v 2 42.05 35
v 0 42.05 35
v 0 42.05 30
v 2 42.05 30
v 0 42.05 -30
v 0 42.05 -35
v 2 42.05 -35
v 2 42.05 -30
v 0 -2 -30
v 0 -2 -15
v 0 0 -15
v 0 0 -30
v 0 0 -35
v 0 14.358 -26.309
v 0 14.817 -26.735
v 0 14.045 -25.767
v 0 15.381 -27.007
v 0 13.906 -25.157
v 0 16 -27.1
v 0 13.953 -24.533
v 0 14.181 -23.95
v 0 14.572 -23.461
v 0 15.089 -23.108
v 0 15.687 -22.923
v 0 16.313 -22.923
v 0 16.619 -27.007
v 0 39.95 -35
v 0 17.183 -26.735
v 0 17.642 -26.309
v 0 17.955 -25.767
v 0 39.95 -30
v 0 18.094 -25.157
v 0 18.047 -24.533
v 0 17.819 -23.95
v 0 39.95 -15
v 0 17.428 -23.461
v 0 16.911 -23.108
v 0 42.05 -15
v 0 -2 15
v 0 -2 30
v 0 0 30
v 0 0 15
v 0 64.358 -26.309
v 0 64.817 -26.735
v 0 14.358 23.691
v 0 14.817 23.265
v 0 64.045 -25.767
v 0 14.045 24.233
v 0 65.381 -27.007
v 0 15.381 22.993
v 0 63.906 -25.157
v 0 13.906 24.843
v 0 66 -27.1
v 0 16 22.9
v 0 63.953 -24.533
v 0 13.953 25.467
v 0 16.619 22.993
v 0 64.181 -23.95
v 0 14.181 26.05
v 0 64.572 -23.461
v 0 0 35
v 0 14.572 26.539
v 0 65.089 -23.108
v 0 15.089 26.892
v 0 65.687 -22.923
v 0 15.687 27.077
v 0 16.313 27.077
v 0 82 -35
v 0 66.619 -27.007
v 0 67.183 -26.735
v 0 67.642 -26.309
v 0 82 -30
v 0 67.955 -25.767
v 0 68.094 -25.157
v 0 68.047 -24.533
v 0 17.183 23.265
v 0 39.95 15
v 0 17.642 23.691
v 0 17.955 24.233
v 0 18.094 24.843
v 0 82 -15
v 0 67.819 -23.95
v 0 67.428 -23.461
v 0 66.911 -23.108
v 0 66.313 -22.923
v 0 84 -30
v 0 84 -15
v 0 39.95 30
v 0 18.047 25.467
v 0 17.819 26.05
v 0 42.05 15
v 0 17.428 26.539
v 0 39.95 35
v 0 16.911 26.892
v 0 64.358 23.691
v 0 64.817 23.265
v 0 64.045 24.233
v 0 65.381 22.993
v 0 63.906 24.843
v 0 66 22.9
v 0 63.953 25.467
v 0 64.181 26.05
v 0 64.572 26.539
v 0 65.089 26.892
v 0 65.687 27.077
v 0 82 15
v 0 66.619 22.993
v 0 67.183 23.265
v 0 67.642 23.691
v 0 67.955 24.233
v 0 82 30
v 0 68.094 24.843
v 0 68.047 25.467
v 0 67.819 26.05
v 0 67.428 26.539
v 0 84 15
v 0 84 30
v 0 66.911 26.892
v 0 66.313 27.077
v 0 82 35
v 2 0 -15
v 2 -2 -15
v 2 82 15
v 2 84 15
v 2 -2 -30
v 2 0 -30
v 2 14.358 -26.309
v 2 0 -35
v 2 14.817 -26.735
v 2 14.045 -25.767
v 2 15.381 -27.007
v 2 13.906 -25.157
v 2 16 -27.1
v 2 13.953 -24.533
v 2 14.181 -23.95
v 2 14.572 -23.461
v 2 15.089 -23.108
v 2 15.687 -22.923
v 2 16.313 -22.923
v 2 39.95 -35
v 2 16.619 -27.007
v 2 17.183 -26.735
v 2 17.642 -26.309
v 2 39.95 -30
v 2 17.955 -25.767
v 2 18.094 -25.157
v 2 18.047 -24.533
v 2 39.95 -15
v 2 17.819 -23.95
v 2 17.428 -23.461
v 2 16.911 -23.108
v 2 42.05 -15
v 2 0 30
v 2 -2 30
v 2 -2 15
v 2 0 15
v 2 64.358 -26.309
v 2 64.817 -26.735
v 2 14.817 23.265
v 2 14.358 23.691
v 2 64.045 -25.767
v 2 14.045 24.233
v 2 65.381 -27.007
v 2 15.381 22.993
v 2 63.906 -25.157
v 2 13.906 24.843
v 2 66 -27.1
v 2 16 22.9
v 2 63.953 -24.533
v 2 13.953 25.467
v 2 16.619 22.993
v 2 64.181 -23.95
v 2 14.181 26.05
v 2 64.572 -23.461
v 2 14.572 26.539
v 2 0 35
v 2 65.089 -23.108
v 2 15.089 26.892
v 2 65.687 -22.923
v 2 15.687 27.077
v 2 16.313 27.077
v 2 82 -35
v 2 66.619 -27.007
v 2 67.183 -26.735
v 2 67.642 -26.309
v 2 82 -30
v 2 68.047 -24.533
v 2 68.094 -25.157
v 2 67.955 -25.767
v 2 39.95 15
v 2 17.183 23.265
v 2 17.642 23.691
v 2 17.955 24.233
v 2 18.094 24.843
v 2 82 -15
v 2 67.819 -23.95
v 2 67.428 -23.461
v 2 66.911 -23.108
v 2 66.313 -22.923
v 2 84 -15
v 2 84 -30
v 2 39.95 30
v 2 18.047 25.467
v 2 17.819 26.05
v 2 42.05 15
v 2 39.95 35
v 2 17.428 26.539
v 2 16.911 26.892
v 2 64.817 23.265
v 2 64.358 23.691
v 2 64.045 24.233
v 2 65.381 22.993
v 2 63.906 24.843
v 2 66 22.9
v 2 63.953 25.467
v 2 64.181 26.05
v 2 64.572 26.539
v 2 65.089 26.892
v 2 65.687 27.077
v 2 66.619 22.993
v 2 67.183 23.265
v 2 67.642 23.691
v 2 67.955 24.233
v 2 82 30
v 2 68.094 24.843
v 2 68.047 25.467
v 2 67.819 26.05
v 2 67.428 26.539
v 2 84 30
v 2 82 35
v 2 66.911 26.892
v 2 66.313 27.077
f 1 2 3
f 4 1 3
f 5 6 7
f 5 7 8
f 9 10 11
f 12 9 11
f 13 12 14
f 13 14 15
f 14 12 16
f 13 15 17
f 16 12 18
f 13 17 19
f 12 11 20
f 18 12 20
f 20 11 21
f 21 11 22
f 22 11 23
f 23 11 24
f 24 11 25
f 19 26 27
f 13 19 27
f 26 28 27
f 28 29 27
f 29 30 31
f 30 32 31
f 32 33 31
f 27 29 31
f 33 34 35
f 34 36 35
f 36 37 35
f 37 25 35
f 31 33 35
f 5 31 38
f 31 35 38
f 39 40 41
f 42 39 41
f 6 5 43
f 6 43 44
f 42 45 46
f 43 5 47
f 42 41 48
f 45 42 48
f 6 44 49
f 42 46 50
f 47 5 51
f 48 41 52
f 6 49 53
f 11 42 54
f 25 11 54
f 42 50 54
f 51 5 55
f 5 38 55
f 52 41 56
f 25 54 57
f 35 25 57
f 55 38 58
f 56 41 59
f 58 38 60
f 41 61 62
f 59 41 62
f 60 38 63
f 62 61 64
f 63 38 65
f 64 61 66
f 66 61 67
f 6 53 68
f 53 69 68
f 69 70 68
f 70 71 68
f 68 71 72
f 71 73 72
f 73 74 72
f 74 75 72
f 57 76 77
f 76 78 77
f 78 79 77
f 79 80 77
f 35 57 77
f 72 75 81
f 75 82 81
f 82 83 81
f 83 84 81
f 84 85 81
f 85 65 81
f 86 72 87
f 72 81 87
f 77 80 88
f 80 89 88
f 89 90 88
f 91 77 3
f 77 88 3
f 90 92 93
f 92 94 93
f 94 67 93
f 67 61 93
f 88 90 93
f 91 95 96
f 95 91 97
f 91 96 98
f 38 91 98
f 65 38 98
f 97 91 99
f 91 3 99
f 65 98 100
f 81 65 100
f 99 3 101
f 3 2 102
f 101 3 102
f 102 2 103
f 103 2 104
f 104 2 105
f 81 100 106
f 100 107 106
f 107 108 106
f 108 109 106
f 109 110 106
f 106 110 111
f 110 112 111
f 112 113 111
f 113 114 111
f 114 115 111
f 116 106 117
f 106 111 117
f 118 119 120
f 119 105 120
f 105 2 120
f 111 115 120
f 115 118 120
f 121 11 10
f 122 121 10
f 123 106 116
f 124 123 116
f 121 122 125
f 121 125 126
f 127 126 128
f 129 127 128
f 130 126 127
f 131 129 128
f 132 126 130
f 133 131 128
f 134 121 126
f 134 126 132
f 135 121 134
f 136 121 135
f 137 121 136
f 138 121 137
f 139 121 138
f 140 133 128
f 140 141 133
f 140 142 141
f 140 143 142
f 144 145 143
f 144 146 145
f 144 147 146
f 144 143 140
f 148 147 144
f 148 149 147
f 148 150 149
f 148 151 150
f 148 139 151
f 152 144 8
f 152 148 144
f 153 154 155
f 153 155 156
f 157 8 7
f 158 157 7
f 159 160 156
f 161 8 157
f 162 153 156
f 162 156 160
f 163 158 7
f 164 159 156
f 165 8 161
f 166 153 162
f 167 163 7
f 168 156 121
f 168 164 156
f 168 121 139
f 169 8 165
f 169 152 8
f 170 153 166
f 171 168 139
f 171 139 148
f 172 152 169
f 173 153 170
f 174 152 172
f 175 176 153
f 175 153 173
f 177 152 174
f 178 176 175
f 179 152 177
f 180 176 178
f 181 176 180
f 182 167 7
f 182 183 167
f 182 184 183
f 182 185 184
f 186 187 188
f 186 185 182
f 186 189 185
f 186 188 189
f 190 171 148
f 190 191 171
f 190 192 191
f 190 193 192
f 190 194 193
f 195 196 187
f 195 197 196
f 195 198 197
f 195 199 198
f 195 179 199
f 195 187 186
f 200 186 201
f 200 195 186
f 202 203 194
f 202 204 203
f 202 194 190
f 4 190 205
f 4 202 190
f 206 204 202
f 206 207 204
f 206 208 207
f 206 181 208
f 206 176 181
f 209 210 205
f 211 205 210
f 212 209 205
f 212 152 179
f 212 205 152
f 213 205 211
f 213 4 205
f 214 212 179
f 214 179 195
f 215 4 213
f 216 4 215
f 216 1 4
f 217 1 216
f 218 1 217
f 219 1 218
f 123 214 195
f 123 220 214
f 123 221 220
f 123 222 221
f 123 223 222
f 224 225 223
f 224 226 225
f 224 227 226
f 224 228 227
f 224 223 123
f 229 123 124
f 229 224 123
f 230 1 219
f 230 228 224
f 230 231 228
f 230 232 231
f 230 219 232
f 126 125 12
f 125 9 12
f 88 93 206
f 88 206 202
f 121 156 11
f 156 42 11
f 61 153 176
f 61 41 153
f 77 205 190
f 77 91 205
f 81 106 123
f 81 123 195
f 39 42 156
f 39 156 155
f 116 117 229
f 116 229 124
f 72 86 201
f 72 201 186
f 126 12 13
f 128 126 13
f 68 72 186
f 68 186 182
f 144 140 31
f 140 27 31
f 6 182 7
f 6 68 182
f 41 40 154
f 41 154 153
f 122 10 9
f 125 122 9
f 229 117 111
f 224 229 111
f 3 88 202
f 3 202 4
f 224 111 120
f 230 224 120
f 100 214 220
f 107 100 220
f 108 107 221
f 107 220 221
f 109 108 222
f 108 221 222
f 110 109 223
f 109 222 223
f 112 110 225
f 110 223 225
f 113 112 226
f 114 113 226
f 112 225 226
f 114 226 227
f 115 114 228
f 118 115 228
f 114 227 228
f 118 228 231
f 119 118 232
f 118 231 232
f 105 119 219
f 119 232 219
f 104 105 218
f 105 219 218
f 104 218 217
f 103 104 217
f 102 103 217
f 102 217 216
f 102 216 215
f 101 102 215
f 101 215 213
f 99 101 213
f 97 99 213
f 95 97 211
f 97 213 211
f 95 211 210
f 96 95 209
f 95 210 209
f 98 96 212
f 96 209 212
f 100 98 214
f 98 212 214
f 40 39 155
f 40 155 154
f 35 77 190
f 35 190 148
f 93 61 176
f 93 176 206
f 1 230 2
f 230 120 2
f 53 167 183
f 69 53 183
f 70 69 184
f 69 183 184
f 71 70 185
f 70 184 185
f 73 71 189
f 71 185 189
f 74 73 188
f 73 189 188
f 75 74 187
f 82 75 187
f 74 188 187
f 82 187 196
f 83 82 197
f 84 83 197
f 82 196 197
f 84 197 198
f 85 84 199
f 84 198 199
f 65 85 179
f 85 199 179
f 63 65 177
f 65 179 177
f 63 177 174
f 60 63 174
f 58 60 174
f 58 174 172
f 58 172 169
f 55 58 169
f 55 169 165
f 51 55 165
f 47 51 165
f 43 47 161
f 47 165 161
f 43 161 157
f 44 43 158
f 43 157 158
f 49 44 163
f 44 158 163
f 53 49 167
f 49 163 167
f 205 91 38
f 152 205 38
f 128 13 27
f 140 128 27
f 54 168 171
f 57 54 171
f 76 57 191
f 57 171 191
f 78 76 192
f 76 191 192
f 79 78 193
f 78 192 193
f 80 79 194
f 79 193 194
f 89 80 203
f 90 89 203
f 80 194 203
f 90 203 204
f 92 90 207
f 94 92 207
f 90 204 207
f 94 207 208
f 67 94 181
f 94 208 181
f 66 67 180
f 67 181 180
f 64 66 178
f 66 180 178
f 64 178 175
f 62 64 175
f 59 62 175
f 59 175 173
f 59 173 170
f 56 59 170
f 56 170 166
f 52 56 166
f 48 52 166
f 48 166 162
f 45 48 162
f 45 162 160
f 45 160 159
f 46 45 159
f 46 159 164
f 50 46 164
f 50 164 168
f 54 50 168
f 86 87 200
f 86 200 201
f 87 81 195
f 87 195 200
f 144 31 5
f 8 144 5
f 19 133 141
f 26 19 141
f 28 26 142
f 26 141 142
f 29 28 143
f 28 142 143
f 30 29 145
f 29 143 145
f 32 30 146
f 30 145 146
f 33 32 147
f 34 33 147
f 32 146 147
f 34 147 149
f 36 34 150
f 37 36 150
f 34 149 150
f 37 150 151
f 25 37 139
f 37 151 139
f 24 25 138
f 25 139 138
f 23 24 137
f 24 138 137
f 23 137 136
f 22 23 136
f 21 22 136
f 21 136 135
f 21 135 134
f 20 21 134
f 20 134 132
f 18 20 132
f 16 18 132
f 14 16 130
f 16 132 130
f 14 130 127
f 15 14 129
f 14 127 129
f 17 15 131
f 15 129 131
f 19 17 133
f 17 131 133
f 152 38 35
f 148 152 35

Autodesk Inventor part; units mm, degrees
ref_plane "YZ Plane" through (0, 0, 0) normal (1, 0, 0) x (0, 1, 0)
ref_plane "XZ Plane" through (0, 0, 0) normal (0, 1, 0) x (-1, 0, 0)
ref_plane "XY Plane" through (0, 0, 0) normal (0, 0, 1) x (1, 0, 0)
sketch "Sketch1" plane through (0, 0, 0) normal (1, 0, 0) x (0, 1, 0)
  line L0 (0, 15) -> (0, 0)
  line L1 (0, 15) -> (-2, 15)
  line L2 (-2, 15) -> (-2, 30)
  line L3 (-2, 30) -> (0, 30)
  line L4 (0, 30) -> (0, 35)
  line L5 (0, 35) -> (39.95, 35)
  line L6 (20, 0) -> (0, 0) construction
  line L7 (39.95, 35) -> (39.95, 30)
  line L8 (39.95, 30) -> (42.05, 30)
  line L9 (42.05, 15) -> (39.95, 15)
  line L10 (39.95, 15) -> (39.95, 0)
  line L11 (39.95, 0) -> (20, 0) construction
  line L12 (0, -15) -> (0, 0)
  line L13 (0, -15) -> (-2, -15)
  line L14 (-2, -15) -> (-2, -30)
  line L15 (-2, -30) -> (0, -30)
  line L16 (0, -30) -> (0, -35)
  line L17 (0, -35) -> (39.95, -35)
  line L18 (39.95, -35) -> (39.95, -30)
  line L19 (39.95, -30) -> (42.05, -30)
  line L20 (42.05, -15) -> (39.95, -15)
  line L21 (39.95, -15) -> (39.95, 0)
  line L22 (41, 30) -> (41, -30) construction
  line L23 (82, 15) -> (82, 0)
  line L24 (82, 15) -> (84, 15)
  line L25 (84, 30) -> (82, 30)
  line L26 (82, 30) -> (82, 35)
  line L27 (82, 35) -> (42.05, 35)
  line L28 (42.05, 35) -> (42.05, 30)
  line L29 (42.05, 15) -> (42.05, 0)
  line L30 (42.05, -35) -> (42.05, -30)
  line L31 (42.05, -15) -> (42.05, 0)
  line L32 (82, -15) -> (84, -15)
  line L33 (84, -15) -> (84, -30)
  line L34 (84, -30) -> (82, -30)
  line L35 (82, -30) -> (82, -35)
  line L36 (82, -15) -> (82, 0)
  line L37 (82, -35) -> (42.05, -35)
  line L38 (84, 30) -> (84, 15)
  dimension "d3" = 15
  dimension "d6" = 20
  dimension "d7" = 35
  dimension "d8" = 15
  dimension "d9" = 2
  dimension "d17" = 2.1
  dimension "d23" = 41
extrude "Wyciągnięcie proste1" add sketch "Sketch1" along normal blind 2
sketch "Szkic3" plane through (2, 0, 0) normal (1, 0, 0) x (0, 0, -1)
  line L0 (-25, 16) -> (25, 16) construction
  line L1 (25, 16) -> (25, 66) construction
  line L2 (25, 66) -> (-25, 66) construction
  line L3 (-25, 66) -> (-25, 16) construction
  line L4 (-25, 16) -> (25, 66) construction
  line L5 (25, 16) -> (-25, 66) construction
  line L6 (0, 41) -> (0, 42.05) construction
  line L7 (-15, 42.05) -> (15, 42.05) construction
  line L8 (0, 41) -> (15, 41) construction
  line L9 (15, 42.05) -> (15, 39.95) construction
  circle A0 centre (-25, 66) radius 2.1
  circle A1 centre (25, 66) radius 2.1
  circle A2 centre (25, 16) radius 2.1
  circle A3 centre (-25, 16) radius 2.1
  point P0 (0, 0)
  dimension "d18" = 4.2
  dimension "d19" = 50
  dimension "d20" = 50
extrude "Wyciągnięcie proste2" cut sketch "Szkic3" against normal up to surface (2 mm away)
sketch "Sketch4" plane through (2, 0, 0) normal (1, 0, 0) x (0, 0, -1)
  circle A0 centre (25, 16) radius 2.1 projected
  circle A1 centre (-25, 16) radius 2.1 projected
  circle A2 centre (25, 66) radius 2.1 projected
  circle A3 centre (-25, 66) radius 2.1 projected
  line L0 (-15, 42.05) -> (15, 42.05) projected
  line L1 (15, 42.05) -> (15, 39.95) projected
  line L2 (15, 39.95) -> (-15, 39.95) projected
  line L3 (-15, 39.95) -> (-15, 42.05) projected
  line L4 (-15, 0) -> (15, 0) projected
  line L5 (15, 0) -> (15, -2) projected
  line L6 (15, -2) -> (30, -2) projected
  line L7 (30, -2) -> (30, 0) projected
  line L8 (30, 0) -> (35, 0) projected
  line L9 (35, 0) -> (35, 39.95) projected
  line L10 (35, 39.95) -> (30, 39.95) projected
  line L11 (30, 39.95) -> (30, 42.05) projected
  line L12 (30, 42.05) -> (35, 42.05) projected
  line L13 (35, 42.05) -> (35, 82) projected
  line L14 (35, 82) -> (30, 82) projected
  line L15 (30, 82) -> (30, 84) projected
  line L16 (30, 84) -> (15, 84) projected
  line L17 (15, 84) -> (15, 82) projected
  line L18 (15, 82) -> (-15, 82) projected
  line L19 (-15, 82) -> (-15, 84) projected
  line L20 (-15, 84) -> (-30, 84) projected
  line L21 (-30, 84) -> (-30, 82) projected
  line L22 (-30, 82) -> (-35, 82) projected
  line L23 (-35, 82) -> (-35, 42.05) projected
  line L24 (-35, 42.05) -> (-30, 42.05) projected
  line L25 (-30, 42.05) -> (-30, 39.95) projected
  line L26 (-30, 39.95) -> (-35, 39.95) projected
  line L27 (-35, 39.95) -> (-35, 0) projected
  line L28 (-35, 0) -> (-30, 0) projected
  line L29 (-30, 0) -> (-30, -2) projected
  line L30 (-30, -2) -> (-15, -2) projected
  line L31 (-15, -2) -> (-15, 0) projected
  point P0 (0, 0)
equation "\"d6\" = 0.5 * d10"
equation "\"d10\" = 40"
properties part number "CH_01_0010_syringe_pump_servo" material "Aluminum 6061"
